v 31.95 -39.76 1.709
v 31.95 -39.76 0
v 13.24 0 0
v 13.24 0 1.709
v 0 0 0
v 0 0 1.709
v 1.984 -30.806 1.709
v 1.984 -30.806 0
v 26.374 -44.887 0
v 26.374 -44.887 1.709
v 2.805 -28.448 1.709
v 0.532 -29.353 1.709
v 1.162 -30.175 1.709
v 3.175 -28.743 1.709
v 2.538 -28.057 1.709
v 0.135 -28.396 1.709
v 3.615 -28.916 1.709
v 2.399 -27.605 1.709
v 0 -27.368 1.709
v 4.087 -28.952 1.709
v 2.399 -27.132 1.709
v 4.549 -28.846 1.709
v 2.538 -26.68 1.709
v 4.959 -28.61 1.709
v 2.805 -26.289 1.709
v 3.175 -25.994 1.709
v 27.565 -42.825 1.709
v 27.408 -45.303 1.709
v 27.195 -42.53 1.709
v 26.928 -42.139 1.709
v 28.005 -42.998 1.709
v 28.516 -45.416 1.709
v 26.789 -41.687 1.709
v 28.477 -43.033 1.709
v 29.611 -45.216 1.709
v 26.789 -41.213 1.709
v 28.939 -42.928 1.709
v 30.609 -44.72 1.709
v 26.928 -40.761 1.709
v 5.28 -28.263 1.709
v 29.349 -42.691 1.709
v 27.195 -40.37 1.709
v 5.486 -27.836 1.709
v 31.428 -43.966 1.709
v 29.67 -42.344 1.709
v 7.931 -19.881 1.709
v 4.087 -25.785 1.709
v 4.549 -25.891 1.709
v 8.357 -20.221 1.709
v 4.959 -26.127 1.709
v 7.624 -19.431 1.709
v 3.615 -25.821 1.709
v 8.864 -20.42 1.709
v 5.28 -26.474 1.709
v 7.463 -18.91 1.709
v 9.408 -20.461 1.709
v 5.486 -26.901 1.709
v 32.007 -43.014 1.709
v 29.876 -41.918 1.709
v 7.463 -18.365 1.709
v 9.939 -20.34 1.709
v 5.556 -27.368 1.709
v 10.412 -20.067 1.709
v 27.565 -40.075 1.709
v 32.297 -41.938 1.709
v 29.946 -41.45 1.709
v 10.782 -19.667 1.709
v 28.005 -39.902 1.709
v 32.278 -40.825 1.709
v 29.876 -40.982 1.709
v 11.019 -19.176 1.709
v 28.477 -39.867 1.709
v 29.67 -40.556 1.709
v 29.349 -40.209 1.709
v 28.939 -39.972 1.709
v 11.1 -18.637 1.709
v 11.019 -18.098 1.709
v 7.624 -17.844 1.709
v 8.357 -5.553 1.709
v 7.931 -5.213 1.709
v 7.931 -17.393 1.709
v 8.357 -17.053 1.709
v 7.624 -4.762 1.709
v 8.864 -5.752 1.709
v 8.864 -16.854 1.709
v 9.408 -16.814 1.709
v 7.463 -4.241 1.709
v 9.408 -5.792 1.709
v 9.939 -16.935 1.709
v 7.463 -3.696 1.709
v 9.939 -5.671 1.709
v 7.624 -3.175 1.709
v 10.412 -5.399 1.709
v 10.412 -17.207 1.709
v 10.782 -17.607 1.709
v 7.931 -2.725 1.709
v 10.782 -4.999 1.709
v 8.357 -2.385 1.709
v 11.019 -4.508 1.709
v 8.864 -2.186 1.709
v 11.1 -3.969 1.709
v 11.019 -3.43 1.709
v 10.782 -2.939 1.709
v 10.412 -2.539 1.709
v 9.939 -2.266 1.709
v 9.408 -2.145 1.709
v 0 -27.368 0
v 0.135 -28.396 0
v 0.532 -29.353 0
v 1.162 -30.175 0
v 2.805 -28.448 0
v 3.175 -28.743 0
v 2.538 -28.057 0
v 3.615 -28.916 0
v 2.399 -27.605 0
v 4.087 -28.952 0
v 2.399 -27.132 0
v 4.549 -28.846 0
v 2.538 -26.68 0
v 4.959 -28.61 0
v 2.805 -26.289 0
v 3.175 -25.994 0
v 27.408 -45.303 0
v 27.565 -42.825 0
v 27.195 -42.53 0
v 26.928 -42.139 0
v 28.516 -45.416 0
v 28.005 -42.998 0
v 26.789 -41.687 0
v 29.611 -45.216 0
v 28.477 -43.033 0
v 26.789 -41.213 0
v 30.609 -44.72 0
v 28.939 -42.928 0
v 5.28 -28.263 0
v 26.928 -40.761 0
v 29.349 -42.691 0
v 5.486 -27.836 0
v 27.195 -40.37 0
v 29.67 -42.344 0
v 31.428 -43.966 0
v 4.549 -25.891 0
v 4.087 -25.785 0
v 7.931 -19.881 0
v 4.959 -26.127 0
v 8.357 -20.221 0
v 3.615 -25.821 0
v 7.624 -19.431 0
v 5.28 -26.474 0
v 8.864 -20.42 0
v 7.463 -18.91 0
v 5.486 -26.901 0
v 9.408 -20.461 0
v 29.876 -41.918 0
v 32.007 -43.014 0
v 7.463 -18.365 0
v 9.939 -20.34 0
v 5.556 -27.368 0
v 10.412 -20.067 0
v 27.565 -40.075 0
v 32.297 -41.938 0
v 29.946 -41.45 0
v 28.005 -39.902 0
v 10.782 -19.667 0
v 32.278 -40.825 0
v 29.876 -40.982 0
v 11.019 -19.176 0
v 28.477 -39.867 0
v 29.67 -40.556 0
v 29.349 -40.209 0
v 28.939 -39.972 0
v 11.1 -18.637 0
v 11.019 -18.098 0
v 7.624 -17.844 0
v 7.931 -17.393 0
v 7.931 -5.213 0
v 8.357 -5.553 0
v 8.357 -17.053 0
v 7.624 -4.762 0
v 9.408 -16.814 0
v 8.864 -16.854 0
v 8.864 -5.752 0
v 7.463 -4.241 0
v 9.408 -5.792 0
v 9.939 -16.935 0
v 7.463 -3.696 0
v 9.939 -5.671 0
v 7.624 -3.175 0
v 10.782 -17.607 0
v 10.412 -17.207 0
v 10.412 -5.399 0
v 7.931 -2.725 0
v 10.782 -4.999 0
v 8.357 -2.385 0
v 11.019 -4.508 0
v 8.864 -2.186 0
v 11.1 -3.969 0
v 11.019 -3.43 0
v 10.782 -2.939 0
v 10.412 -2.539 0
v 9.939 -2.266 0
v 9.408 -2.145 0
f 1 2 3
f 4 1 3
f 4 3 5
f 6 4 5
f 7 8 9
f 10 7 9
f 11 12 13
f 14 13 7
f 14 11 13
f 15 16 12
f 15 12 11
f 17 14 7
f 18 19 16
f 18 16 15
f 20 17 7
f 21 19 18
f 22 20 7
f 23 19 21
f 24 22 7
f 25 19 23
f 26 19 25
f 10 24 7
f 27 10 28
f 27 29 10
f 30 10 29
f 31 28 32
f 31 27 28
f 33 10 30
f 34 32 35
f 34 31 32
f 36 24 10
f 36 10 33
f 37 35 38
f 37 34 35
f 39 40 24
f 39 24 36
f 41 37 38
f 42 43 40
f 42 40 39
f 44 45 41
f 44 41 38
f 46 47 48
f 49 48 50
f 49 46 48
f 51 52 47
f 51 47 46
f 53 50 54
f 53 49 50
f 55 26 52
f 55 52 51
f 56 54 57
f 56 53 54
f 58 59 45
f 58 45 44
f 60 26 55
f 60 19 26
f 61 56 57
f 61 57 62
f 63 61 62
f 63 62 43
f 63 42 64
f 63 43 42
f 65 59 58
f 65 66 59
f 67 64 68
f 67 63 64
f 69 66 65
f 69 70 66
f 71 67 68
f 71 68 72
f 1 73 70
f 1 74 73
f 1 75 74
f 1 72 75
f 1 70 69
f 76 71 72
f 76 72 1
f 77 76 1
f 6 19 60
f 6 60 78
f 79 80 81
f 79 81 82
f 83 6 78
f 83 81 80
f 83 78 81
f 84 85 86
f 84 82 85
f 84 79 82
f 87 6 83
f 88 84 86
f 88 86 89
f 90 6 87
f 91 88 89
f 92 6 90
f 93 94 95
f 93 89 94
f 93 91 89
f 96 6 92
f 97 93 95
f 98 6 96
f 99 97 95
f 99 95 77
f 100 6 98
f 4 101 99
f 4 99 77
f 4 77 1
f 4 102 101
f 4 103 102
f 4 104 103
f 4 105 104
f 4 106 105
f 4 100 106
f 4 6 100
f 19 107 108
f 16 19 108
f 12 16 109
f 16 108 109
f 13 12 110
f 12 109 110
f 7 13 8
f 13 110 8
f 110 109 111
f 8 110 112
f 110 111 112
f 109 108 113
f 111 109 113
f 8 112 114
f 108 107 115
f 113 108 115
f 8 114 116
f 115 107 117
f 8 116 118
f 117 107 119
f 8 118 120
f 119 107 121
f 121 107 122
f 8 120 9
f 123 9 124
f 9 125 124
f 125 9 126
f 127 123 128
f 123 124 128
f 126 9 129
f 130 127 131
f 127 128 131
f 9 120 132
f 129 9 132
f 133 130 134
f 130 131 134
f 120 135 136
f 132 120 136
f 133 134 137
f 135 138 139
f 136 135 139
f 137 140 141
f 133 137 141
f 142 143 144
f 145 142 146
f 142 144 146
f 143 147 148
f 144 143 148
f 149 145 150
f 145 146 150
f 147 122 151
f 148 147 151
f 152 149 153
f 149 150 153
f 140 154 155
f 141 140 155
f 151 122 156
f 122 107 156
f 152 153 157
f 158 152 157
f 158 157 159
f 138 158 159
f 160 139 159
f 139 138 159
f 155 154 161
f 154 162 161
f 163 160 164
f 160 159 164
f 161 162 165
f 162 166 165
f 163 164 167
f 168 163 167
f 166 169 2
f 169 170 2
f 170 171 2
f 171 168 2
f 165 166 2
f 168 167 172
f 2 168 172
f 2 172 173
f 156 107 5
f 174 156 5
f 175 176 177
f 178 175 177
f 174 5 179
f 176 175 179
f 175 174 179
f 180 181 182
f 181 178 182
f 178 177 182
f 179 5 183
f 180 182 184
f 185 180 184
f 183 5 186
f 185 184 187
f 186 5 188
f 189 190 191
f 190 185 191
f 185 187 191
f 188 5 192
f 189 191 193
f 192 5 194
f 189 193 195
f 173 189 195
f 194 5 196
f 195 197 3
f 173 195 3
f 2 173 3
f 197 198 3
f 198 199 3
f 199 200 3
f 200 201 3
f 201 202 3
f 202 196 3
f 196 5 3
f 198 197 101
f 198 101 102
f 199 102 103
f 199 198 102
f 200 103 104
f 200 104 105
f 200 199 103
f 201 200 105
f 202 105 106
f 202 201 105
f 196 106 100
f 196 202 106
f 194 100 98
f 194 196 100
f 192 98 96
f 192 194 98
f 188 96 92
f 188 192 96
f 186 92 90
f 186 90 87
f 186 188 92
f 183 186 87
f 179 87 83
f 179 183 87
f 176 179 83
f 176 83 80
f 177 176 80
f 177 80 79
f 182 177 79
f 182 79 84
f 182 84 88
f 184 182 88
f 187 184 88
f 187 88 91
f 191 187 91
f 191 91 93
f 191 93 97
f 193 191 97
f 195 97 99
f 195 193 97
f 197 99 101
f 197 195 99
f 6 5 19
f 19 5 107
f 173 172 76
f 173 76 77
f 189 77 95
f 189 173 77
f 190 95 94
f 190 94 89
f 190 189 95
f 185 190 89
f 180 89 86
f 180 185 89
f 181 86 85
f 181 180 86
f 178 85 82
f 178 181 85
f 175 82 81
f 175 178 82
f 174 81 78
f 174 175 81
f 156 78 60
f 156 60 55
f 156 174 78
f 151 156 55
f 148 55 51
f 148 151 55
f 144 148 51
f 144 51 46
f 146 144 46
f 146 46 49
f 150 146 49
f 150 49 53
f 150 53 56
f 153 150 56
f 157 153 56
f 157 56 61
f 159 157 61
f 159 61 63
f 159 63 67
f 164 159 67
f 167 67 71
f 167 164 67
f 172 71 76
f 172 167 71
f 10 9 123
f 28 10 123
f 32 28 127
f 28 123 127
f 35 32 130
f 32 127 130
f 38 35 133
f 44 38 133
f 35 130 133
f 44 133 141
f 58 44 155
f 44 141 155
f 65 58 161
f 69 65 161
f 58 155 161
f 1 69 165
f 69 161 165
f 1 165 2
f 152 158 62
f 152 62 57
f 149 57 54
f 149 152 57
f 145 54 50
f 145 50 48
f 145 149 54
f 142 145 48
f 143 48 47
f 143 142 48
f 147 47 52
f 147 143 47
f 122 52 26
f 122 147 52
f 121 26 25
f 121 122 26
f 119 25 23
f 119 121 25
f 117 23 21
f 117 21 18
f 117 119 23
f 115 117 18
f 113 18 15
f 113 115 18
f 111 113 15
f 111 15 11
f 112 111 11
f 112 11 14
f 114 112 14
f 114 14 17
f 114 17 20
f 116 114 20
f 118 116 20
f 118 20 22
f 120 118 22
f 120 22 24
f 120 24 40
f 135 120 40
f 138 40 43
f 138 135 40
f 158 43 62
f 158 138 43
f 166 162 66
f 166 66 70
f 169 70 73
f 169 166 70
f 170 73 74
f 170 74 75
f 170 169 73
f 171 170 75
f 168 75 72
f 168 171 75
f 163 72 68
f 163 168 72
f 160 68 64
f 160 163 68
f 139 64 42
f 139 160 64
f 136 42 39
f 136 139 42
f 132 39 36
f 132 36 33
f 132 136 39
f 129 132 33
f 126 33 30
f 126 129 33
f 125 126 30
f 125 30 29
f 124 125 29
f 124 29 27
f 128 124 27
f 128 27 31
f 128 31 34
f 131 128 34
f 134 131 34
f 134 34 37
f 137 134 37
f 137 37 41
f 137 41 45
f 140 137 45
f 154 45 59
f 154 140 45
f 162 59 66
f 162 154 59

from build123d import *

# Parameters (mm, degrees)
F0_R     = 1.5875
F0_R_2   = 1.8288
F1_DEPTH = 1.70942


with BuildPart() as f1:
    # F0 (on Top) → F1 (new body)
    with BuildSketch(Plane.XY):
        with BuildLine():
            Line((13.24008, 0), (0, 0))
            Line((0, 0), (0, -27.3685))
            ThreePointArc((0, -27.3685), (0.531712, -29.352875), (1.984375, -30.805538))
            Line((1.984375, -30.805538), (26.374369, -44.887108))
            ThreePointArc((26.374369, -44.887108), (31.045093, -44.371457), (31.949778, -39.760262))
            Line((31.949778, -39.760262), (13.24008, 0))
        make_face()
        with Locations((3.96875, -27.3685)):
            Circle(F0_R, mode=Mode.SUBTRACT)
        with Locations((28.358744, -41.45007)):
            Circle(F0_R, mode=Mode.SUBTRACT)
        with Locations((9.27133, -18.63725)):
            Circle(F0_R_2, mode=Mode.SUBTRACT)
        with Locations((9.27133, -3.96875)):
            Circle(F0_R_2, mode=Mode.SUBTRACT)
    extrude(amount=F1_DEPTH)


solid = f1.part
